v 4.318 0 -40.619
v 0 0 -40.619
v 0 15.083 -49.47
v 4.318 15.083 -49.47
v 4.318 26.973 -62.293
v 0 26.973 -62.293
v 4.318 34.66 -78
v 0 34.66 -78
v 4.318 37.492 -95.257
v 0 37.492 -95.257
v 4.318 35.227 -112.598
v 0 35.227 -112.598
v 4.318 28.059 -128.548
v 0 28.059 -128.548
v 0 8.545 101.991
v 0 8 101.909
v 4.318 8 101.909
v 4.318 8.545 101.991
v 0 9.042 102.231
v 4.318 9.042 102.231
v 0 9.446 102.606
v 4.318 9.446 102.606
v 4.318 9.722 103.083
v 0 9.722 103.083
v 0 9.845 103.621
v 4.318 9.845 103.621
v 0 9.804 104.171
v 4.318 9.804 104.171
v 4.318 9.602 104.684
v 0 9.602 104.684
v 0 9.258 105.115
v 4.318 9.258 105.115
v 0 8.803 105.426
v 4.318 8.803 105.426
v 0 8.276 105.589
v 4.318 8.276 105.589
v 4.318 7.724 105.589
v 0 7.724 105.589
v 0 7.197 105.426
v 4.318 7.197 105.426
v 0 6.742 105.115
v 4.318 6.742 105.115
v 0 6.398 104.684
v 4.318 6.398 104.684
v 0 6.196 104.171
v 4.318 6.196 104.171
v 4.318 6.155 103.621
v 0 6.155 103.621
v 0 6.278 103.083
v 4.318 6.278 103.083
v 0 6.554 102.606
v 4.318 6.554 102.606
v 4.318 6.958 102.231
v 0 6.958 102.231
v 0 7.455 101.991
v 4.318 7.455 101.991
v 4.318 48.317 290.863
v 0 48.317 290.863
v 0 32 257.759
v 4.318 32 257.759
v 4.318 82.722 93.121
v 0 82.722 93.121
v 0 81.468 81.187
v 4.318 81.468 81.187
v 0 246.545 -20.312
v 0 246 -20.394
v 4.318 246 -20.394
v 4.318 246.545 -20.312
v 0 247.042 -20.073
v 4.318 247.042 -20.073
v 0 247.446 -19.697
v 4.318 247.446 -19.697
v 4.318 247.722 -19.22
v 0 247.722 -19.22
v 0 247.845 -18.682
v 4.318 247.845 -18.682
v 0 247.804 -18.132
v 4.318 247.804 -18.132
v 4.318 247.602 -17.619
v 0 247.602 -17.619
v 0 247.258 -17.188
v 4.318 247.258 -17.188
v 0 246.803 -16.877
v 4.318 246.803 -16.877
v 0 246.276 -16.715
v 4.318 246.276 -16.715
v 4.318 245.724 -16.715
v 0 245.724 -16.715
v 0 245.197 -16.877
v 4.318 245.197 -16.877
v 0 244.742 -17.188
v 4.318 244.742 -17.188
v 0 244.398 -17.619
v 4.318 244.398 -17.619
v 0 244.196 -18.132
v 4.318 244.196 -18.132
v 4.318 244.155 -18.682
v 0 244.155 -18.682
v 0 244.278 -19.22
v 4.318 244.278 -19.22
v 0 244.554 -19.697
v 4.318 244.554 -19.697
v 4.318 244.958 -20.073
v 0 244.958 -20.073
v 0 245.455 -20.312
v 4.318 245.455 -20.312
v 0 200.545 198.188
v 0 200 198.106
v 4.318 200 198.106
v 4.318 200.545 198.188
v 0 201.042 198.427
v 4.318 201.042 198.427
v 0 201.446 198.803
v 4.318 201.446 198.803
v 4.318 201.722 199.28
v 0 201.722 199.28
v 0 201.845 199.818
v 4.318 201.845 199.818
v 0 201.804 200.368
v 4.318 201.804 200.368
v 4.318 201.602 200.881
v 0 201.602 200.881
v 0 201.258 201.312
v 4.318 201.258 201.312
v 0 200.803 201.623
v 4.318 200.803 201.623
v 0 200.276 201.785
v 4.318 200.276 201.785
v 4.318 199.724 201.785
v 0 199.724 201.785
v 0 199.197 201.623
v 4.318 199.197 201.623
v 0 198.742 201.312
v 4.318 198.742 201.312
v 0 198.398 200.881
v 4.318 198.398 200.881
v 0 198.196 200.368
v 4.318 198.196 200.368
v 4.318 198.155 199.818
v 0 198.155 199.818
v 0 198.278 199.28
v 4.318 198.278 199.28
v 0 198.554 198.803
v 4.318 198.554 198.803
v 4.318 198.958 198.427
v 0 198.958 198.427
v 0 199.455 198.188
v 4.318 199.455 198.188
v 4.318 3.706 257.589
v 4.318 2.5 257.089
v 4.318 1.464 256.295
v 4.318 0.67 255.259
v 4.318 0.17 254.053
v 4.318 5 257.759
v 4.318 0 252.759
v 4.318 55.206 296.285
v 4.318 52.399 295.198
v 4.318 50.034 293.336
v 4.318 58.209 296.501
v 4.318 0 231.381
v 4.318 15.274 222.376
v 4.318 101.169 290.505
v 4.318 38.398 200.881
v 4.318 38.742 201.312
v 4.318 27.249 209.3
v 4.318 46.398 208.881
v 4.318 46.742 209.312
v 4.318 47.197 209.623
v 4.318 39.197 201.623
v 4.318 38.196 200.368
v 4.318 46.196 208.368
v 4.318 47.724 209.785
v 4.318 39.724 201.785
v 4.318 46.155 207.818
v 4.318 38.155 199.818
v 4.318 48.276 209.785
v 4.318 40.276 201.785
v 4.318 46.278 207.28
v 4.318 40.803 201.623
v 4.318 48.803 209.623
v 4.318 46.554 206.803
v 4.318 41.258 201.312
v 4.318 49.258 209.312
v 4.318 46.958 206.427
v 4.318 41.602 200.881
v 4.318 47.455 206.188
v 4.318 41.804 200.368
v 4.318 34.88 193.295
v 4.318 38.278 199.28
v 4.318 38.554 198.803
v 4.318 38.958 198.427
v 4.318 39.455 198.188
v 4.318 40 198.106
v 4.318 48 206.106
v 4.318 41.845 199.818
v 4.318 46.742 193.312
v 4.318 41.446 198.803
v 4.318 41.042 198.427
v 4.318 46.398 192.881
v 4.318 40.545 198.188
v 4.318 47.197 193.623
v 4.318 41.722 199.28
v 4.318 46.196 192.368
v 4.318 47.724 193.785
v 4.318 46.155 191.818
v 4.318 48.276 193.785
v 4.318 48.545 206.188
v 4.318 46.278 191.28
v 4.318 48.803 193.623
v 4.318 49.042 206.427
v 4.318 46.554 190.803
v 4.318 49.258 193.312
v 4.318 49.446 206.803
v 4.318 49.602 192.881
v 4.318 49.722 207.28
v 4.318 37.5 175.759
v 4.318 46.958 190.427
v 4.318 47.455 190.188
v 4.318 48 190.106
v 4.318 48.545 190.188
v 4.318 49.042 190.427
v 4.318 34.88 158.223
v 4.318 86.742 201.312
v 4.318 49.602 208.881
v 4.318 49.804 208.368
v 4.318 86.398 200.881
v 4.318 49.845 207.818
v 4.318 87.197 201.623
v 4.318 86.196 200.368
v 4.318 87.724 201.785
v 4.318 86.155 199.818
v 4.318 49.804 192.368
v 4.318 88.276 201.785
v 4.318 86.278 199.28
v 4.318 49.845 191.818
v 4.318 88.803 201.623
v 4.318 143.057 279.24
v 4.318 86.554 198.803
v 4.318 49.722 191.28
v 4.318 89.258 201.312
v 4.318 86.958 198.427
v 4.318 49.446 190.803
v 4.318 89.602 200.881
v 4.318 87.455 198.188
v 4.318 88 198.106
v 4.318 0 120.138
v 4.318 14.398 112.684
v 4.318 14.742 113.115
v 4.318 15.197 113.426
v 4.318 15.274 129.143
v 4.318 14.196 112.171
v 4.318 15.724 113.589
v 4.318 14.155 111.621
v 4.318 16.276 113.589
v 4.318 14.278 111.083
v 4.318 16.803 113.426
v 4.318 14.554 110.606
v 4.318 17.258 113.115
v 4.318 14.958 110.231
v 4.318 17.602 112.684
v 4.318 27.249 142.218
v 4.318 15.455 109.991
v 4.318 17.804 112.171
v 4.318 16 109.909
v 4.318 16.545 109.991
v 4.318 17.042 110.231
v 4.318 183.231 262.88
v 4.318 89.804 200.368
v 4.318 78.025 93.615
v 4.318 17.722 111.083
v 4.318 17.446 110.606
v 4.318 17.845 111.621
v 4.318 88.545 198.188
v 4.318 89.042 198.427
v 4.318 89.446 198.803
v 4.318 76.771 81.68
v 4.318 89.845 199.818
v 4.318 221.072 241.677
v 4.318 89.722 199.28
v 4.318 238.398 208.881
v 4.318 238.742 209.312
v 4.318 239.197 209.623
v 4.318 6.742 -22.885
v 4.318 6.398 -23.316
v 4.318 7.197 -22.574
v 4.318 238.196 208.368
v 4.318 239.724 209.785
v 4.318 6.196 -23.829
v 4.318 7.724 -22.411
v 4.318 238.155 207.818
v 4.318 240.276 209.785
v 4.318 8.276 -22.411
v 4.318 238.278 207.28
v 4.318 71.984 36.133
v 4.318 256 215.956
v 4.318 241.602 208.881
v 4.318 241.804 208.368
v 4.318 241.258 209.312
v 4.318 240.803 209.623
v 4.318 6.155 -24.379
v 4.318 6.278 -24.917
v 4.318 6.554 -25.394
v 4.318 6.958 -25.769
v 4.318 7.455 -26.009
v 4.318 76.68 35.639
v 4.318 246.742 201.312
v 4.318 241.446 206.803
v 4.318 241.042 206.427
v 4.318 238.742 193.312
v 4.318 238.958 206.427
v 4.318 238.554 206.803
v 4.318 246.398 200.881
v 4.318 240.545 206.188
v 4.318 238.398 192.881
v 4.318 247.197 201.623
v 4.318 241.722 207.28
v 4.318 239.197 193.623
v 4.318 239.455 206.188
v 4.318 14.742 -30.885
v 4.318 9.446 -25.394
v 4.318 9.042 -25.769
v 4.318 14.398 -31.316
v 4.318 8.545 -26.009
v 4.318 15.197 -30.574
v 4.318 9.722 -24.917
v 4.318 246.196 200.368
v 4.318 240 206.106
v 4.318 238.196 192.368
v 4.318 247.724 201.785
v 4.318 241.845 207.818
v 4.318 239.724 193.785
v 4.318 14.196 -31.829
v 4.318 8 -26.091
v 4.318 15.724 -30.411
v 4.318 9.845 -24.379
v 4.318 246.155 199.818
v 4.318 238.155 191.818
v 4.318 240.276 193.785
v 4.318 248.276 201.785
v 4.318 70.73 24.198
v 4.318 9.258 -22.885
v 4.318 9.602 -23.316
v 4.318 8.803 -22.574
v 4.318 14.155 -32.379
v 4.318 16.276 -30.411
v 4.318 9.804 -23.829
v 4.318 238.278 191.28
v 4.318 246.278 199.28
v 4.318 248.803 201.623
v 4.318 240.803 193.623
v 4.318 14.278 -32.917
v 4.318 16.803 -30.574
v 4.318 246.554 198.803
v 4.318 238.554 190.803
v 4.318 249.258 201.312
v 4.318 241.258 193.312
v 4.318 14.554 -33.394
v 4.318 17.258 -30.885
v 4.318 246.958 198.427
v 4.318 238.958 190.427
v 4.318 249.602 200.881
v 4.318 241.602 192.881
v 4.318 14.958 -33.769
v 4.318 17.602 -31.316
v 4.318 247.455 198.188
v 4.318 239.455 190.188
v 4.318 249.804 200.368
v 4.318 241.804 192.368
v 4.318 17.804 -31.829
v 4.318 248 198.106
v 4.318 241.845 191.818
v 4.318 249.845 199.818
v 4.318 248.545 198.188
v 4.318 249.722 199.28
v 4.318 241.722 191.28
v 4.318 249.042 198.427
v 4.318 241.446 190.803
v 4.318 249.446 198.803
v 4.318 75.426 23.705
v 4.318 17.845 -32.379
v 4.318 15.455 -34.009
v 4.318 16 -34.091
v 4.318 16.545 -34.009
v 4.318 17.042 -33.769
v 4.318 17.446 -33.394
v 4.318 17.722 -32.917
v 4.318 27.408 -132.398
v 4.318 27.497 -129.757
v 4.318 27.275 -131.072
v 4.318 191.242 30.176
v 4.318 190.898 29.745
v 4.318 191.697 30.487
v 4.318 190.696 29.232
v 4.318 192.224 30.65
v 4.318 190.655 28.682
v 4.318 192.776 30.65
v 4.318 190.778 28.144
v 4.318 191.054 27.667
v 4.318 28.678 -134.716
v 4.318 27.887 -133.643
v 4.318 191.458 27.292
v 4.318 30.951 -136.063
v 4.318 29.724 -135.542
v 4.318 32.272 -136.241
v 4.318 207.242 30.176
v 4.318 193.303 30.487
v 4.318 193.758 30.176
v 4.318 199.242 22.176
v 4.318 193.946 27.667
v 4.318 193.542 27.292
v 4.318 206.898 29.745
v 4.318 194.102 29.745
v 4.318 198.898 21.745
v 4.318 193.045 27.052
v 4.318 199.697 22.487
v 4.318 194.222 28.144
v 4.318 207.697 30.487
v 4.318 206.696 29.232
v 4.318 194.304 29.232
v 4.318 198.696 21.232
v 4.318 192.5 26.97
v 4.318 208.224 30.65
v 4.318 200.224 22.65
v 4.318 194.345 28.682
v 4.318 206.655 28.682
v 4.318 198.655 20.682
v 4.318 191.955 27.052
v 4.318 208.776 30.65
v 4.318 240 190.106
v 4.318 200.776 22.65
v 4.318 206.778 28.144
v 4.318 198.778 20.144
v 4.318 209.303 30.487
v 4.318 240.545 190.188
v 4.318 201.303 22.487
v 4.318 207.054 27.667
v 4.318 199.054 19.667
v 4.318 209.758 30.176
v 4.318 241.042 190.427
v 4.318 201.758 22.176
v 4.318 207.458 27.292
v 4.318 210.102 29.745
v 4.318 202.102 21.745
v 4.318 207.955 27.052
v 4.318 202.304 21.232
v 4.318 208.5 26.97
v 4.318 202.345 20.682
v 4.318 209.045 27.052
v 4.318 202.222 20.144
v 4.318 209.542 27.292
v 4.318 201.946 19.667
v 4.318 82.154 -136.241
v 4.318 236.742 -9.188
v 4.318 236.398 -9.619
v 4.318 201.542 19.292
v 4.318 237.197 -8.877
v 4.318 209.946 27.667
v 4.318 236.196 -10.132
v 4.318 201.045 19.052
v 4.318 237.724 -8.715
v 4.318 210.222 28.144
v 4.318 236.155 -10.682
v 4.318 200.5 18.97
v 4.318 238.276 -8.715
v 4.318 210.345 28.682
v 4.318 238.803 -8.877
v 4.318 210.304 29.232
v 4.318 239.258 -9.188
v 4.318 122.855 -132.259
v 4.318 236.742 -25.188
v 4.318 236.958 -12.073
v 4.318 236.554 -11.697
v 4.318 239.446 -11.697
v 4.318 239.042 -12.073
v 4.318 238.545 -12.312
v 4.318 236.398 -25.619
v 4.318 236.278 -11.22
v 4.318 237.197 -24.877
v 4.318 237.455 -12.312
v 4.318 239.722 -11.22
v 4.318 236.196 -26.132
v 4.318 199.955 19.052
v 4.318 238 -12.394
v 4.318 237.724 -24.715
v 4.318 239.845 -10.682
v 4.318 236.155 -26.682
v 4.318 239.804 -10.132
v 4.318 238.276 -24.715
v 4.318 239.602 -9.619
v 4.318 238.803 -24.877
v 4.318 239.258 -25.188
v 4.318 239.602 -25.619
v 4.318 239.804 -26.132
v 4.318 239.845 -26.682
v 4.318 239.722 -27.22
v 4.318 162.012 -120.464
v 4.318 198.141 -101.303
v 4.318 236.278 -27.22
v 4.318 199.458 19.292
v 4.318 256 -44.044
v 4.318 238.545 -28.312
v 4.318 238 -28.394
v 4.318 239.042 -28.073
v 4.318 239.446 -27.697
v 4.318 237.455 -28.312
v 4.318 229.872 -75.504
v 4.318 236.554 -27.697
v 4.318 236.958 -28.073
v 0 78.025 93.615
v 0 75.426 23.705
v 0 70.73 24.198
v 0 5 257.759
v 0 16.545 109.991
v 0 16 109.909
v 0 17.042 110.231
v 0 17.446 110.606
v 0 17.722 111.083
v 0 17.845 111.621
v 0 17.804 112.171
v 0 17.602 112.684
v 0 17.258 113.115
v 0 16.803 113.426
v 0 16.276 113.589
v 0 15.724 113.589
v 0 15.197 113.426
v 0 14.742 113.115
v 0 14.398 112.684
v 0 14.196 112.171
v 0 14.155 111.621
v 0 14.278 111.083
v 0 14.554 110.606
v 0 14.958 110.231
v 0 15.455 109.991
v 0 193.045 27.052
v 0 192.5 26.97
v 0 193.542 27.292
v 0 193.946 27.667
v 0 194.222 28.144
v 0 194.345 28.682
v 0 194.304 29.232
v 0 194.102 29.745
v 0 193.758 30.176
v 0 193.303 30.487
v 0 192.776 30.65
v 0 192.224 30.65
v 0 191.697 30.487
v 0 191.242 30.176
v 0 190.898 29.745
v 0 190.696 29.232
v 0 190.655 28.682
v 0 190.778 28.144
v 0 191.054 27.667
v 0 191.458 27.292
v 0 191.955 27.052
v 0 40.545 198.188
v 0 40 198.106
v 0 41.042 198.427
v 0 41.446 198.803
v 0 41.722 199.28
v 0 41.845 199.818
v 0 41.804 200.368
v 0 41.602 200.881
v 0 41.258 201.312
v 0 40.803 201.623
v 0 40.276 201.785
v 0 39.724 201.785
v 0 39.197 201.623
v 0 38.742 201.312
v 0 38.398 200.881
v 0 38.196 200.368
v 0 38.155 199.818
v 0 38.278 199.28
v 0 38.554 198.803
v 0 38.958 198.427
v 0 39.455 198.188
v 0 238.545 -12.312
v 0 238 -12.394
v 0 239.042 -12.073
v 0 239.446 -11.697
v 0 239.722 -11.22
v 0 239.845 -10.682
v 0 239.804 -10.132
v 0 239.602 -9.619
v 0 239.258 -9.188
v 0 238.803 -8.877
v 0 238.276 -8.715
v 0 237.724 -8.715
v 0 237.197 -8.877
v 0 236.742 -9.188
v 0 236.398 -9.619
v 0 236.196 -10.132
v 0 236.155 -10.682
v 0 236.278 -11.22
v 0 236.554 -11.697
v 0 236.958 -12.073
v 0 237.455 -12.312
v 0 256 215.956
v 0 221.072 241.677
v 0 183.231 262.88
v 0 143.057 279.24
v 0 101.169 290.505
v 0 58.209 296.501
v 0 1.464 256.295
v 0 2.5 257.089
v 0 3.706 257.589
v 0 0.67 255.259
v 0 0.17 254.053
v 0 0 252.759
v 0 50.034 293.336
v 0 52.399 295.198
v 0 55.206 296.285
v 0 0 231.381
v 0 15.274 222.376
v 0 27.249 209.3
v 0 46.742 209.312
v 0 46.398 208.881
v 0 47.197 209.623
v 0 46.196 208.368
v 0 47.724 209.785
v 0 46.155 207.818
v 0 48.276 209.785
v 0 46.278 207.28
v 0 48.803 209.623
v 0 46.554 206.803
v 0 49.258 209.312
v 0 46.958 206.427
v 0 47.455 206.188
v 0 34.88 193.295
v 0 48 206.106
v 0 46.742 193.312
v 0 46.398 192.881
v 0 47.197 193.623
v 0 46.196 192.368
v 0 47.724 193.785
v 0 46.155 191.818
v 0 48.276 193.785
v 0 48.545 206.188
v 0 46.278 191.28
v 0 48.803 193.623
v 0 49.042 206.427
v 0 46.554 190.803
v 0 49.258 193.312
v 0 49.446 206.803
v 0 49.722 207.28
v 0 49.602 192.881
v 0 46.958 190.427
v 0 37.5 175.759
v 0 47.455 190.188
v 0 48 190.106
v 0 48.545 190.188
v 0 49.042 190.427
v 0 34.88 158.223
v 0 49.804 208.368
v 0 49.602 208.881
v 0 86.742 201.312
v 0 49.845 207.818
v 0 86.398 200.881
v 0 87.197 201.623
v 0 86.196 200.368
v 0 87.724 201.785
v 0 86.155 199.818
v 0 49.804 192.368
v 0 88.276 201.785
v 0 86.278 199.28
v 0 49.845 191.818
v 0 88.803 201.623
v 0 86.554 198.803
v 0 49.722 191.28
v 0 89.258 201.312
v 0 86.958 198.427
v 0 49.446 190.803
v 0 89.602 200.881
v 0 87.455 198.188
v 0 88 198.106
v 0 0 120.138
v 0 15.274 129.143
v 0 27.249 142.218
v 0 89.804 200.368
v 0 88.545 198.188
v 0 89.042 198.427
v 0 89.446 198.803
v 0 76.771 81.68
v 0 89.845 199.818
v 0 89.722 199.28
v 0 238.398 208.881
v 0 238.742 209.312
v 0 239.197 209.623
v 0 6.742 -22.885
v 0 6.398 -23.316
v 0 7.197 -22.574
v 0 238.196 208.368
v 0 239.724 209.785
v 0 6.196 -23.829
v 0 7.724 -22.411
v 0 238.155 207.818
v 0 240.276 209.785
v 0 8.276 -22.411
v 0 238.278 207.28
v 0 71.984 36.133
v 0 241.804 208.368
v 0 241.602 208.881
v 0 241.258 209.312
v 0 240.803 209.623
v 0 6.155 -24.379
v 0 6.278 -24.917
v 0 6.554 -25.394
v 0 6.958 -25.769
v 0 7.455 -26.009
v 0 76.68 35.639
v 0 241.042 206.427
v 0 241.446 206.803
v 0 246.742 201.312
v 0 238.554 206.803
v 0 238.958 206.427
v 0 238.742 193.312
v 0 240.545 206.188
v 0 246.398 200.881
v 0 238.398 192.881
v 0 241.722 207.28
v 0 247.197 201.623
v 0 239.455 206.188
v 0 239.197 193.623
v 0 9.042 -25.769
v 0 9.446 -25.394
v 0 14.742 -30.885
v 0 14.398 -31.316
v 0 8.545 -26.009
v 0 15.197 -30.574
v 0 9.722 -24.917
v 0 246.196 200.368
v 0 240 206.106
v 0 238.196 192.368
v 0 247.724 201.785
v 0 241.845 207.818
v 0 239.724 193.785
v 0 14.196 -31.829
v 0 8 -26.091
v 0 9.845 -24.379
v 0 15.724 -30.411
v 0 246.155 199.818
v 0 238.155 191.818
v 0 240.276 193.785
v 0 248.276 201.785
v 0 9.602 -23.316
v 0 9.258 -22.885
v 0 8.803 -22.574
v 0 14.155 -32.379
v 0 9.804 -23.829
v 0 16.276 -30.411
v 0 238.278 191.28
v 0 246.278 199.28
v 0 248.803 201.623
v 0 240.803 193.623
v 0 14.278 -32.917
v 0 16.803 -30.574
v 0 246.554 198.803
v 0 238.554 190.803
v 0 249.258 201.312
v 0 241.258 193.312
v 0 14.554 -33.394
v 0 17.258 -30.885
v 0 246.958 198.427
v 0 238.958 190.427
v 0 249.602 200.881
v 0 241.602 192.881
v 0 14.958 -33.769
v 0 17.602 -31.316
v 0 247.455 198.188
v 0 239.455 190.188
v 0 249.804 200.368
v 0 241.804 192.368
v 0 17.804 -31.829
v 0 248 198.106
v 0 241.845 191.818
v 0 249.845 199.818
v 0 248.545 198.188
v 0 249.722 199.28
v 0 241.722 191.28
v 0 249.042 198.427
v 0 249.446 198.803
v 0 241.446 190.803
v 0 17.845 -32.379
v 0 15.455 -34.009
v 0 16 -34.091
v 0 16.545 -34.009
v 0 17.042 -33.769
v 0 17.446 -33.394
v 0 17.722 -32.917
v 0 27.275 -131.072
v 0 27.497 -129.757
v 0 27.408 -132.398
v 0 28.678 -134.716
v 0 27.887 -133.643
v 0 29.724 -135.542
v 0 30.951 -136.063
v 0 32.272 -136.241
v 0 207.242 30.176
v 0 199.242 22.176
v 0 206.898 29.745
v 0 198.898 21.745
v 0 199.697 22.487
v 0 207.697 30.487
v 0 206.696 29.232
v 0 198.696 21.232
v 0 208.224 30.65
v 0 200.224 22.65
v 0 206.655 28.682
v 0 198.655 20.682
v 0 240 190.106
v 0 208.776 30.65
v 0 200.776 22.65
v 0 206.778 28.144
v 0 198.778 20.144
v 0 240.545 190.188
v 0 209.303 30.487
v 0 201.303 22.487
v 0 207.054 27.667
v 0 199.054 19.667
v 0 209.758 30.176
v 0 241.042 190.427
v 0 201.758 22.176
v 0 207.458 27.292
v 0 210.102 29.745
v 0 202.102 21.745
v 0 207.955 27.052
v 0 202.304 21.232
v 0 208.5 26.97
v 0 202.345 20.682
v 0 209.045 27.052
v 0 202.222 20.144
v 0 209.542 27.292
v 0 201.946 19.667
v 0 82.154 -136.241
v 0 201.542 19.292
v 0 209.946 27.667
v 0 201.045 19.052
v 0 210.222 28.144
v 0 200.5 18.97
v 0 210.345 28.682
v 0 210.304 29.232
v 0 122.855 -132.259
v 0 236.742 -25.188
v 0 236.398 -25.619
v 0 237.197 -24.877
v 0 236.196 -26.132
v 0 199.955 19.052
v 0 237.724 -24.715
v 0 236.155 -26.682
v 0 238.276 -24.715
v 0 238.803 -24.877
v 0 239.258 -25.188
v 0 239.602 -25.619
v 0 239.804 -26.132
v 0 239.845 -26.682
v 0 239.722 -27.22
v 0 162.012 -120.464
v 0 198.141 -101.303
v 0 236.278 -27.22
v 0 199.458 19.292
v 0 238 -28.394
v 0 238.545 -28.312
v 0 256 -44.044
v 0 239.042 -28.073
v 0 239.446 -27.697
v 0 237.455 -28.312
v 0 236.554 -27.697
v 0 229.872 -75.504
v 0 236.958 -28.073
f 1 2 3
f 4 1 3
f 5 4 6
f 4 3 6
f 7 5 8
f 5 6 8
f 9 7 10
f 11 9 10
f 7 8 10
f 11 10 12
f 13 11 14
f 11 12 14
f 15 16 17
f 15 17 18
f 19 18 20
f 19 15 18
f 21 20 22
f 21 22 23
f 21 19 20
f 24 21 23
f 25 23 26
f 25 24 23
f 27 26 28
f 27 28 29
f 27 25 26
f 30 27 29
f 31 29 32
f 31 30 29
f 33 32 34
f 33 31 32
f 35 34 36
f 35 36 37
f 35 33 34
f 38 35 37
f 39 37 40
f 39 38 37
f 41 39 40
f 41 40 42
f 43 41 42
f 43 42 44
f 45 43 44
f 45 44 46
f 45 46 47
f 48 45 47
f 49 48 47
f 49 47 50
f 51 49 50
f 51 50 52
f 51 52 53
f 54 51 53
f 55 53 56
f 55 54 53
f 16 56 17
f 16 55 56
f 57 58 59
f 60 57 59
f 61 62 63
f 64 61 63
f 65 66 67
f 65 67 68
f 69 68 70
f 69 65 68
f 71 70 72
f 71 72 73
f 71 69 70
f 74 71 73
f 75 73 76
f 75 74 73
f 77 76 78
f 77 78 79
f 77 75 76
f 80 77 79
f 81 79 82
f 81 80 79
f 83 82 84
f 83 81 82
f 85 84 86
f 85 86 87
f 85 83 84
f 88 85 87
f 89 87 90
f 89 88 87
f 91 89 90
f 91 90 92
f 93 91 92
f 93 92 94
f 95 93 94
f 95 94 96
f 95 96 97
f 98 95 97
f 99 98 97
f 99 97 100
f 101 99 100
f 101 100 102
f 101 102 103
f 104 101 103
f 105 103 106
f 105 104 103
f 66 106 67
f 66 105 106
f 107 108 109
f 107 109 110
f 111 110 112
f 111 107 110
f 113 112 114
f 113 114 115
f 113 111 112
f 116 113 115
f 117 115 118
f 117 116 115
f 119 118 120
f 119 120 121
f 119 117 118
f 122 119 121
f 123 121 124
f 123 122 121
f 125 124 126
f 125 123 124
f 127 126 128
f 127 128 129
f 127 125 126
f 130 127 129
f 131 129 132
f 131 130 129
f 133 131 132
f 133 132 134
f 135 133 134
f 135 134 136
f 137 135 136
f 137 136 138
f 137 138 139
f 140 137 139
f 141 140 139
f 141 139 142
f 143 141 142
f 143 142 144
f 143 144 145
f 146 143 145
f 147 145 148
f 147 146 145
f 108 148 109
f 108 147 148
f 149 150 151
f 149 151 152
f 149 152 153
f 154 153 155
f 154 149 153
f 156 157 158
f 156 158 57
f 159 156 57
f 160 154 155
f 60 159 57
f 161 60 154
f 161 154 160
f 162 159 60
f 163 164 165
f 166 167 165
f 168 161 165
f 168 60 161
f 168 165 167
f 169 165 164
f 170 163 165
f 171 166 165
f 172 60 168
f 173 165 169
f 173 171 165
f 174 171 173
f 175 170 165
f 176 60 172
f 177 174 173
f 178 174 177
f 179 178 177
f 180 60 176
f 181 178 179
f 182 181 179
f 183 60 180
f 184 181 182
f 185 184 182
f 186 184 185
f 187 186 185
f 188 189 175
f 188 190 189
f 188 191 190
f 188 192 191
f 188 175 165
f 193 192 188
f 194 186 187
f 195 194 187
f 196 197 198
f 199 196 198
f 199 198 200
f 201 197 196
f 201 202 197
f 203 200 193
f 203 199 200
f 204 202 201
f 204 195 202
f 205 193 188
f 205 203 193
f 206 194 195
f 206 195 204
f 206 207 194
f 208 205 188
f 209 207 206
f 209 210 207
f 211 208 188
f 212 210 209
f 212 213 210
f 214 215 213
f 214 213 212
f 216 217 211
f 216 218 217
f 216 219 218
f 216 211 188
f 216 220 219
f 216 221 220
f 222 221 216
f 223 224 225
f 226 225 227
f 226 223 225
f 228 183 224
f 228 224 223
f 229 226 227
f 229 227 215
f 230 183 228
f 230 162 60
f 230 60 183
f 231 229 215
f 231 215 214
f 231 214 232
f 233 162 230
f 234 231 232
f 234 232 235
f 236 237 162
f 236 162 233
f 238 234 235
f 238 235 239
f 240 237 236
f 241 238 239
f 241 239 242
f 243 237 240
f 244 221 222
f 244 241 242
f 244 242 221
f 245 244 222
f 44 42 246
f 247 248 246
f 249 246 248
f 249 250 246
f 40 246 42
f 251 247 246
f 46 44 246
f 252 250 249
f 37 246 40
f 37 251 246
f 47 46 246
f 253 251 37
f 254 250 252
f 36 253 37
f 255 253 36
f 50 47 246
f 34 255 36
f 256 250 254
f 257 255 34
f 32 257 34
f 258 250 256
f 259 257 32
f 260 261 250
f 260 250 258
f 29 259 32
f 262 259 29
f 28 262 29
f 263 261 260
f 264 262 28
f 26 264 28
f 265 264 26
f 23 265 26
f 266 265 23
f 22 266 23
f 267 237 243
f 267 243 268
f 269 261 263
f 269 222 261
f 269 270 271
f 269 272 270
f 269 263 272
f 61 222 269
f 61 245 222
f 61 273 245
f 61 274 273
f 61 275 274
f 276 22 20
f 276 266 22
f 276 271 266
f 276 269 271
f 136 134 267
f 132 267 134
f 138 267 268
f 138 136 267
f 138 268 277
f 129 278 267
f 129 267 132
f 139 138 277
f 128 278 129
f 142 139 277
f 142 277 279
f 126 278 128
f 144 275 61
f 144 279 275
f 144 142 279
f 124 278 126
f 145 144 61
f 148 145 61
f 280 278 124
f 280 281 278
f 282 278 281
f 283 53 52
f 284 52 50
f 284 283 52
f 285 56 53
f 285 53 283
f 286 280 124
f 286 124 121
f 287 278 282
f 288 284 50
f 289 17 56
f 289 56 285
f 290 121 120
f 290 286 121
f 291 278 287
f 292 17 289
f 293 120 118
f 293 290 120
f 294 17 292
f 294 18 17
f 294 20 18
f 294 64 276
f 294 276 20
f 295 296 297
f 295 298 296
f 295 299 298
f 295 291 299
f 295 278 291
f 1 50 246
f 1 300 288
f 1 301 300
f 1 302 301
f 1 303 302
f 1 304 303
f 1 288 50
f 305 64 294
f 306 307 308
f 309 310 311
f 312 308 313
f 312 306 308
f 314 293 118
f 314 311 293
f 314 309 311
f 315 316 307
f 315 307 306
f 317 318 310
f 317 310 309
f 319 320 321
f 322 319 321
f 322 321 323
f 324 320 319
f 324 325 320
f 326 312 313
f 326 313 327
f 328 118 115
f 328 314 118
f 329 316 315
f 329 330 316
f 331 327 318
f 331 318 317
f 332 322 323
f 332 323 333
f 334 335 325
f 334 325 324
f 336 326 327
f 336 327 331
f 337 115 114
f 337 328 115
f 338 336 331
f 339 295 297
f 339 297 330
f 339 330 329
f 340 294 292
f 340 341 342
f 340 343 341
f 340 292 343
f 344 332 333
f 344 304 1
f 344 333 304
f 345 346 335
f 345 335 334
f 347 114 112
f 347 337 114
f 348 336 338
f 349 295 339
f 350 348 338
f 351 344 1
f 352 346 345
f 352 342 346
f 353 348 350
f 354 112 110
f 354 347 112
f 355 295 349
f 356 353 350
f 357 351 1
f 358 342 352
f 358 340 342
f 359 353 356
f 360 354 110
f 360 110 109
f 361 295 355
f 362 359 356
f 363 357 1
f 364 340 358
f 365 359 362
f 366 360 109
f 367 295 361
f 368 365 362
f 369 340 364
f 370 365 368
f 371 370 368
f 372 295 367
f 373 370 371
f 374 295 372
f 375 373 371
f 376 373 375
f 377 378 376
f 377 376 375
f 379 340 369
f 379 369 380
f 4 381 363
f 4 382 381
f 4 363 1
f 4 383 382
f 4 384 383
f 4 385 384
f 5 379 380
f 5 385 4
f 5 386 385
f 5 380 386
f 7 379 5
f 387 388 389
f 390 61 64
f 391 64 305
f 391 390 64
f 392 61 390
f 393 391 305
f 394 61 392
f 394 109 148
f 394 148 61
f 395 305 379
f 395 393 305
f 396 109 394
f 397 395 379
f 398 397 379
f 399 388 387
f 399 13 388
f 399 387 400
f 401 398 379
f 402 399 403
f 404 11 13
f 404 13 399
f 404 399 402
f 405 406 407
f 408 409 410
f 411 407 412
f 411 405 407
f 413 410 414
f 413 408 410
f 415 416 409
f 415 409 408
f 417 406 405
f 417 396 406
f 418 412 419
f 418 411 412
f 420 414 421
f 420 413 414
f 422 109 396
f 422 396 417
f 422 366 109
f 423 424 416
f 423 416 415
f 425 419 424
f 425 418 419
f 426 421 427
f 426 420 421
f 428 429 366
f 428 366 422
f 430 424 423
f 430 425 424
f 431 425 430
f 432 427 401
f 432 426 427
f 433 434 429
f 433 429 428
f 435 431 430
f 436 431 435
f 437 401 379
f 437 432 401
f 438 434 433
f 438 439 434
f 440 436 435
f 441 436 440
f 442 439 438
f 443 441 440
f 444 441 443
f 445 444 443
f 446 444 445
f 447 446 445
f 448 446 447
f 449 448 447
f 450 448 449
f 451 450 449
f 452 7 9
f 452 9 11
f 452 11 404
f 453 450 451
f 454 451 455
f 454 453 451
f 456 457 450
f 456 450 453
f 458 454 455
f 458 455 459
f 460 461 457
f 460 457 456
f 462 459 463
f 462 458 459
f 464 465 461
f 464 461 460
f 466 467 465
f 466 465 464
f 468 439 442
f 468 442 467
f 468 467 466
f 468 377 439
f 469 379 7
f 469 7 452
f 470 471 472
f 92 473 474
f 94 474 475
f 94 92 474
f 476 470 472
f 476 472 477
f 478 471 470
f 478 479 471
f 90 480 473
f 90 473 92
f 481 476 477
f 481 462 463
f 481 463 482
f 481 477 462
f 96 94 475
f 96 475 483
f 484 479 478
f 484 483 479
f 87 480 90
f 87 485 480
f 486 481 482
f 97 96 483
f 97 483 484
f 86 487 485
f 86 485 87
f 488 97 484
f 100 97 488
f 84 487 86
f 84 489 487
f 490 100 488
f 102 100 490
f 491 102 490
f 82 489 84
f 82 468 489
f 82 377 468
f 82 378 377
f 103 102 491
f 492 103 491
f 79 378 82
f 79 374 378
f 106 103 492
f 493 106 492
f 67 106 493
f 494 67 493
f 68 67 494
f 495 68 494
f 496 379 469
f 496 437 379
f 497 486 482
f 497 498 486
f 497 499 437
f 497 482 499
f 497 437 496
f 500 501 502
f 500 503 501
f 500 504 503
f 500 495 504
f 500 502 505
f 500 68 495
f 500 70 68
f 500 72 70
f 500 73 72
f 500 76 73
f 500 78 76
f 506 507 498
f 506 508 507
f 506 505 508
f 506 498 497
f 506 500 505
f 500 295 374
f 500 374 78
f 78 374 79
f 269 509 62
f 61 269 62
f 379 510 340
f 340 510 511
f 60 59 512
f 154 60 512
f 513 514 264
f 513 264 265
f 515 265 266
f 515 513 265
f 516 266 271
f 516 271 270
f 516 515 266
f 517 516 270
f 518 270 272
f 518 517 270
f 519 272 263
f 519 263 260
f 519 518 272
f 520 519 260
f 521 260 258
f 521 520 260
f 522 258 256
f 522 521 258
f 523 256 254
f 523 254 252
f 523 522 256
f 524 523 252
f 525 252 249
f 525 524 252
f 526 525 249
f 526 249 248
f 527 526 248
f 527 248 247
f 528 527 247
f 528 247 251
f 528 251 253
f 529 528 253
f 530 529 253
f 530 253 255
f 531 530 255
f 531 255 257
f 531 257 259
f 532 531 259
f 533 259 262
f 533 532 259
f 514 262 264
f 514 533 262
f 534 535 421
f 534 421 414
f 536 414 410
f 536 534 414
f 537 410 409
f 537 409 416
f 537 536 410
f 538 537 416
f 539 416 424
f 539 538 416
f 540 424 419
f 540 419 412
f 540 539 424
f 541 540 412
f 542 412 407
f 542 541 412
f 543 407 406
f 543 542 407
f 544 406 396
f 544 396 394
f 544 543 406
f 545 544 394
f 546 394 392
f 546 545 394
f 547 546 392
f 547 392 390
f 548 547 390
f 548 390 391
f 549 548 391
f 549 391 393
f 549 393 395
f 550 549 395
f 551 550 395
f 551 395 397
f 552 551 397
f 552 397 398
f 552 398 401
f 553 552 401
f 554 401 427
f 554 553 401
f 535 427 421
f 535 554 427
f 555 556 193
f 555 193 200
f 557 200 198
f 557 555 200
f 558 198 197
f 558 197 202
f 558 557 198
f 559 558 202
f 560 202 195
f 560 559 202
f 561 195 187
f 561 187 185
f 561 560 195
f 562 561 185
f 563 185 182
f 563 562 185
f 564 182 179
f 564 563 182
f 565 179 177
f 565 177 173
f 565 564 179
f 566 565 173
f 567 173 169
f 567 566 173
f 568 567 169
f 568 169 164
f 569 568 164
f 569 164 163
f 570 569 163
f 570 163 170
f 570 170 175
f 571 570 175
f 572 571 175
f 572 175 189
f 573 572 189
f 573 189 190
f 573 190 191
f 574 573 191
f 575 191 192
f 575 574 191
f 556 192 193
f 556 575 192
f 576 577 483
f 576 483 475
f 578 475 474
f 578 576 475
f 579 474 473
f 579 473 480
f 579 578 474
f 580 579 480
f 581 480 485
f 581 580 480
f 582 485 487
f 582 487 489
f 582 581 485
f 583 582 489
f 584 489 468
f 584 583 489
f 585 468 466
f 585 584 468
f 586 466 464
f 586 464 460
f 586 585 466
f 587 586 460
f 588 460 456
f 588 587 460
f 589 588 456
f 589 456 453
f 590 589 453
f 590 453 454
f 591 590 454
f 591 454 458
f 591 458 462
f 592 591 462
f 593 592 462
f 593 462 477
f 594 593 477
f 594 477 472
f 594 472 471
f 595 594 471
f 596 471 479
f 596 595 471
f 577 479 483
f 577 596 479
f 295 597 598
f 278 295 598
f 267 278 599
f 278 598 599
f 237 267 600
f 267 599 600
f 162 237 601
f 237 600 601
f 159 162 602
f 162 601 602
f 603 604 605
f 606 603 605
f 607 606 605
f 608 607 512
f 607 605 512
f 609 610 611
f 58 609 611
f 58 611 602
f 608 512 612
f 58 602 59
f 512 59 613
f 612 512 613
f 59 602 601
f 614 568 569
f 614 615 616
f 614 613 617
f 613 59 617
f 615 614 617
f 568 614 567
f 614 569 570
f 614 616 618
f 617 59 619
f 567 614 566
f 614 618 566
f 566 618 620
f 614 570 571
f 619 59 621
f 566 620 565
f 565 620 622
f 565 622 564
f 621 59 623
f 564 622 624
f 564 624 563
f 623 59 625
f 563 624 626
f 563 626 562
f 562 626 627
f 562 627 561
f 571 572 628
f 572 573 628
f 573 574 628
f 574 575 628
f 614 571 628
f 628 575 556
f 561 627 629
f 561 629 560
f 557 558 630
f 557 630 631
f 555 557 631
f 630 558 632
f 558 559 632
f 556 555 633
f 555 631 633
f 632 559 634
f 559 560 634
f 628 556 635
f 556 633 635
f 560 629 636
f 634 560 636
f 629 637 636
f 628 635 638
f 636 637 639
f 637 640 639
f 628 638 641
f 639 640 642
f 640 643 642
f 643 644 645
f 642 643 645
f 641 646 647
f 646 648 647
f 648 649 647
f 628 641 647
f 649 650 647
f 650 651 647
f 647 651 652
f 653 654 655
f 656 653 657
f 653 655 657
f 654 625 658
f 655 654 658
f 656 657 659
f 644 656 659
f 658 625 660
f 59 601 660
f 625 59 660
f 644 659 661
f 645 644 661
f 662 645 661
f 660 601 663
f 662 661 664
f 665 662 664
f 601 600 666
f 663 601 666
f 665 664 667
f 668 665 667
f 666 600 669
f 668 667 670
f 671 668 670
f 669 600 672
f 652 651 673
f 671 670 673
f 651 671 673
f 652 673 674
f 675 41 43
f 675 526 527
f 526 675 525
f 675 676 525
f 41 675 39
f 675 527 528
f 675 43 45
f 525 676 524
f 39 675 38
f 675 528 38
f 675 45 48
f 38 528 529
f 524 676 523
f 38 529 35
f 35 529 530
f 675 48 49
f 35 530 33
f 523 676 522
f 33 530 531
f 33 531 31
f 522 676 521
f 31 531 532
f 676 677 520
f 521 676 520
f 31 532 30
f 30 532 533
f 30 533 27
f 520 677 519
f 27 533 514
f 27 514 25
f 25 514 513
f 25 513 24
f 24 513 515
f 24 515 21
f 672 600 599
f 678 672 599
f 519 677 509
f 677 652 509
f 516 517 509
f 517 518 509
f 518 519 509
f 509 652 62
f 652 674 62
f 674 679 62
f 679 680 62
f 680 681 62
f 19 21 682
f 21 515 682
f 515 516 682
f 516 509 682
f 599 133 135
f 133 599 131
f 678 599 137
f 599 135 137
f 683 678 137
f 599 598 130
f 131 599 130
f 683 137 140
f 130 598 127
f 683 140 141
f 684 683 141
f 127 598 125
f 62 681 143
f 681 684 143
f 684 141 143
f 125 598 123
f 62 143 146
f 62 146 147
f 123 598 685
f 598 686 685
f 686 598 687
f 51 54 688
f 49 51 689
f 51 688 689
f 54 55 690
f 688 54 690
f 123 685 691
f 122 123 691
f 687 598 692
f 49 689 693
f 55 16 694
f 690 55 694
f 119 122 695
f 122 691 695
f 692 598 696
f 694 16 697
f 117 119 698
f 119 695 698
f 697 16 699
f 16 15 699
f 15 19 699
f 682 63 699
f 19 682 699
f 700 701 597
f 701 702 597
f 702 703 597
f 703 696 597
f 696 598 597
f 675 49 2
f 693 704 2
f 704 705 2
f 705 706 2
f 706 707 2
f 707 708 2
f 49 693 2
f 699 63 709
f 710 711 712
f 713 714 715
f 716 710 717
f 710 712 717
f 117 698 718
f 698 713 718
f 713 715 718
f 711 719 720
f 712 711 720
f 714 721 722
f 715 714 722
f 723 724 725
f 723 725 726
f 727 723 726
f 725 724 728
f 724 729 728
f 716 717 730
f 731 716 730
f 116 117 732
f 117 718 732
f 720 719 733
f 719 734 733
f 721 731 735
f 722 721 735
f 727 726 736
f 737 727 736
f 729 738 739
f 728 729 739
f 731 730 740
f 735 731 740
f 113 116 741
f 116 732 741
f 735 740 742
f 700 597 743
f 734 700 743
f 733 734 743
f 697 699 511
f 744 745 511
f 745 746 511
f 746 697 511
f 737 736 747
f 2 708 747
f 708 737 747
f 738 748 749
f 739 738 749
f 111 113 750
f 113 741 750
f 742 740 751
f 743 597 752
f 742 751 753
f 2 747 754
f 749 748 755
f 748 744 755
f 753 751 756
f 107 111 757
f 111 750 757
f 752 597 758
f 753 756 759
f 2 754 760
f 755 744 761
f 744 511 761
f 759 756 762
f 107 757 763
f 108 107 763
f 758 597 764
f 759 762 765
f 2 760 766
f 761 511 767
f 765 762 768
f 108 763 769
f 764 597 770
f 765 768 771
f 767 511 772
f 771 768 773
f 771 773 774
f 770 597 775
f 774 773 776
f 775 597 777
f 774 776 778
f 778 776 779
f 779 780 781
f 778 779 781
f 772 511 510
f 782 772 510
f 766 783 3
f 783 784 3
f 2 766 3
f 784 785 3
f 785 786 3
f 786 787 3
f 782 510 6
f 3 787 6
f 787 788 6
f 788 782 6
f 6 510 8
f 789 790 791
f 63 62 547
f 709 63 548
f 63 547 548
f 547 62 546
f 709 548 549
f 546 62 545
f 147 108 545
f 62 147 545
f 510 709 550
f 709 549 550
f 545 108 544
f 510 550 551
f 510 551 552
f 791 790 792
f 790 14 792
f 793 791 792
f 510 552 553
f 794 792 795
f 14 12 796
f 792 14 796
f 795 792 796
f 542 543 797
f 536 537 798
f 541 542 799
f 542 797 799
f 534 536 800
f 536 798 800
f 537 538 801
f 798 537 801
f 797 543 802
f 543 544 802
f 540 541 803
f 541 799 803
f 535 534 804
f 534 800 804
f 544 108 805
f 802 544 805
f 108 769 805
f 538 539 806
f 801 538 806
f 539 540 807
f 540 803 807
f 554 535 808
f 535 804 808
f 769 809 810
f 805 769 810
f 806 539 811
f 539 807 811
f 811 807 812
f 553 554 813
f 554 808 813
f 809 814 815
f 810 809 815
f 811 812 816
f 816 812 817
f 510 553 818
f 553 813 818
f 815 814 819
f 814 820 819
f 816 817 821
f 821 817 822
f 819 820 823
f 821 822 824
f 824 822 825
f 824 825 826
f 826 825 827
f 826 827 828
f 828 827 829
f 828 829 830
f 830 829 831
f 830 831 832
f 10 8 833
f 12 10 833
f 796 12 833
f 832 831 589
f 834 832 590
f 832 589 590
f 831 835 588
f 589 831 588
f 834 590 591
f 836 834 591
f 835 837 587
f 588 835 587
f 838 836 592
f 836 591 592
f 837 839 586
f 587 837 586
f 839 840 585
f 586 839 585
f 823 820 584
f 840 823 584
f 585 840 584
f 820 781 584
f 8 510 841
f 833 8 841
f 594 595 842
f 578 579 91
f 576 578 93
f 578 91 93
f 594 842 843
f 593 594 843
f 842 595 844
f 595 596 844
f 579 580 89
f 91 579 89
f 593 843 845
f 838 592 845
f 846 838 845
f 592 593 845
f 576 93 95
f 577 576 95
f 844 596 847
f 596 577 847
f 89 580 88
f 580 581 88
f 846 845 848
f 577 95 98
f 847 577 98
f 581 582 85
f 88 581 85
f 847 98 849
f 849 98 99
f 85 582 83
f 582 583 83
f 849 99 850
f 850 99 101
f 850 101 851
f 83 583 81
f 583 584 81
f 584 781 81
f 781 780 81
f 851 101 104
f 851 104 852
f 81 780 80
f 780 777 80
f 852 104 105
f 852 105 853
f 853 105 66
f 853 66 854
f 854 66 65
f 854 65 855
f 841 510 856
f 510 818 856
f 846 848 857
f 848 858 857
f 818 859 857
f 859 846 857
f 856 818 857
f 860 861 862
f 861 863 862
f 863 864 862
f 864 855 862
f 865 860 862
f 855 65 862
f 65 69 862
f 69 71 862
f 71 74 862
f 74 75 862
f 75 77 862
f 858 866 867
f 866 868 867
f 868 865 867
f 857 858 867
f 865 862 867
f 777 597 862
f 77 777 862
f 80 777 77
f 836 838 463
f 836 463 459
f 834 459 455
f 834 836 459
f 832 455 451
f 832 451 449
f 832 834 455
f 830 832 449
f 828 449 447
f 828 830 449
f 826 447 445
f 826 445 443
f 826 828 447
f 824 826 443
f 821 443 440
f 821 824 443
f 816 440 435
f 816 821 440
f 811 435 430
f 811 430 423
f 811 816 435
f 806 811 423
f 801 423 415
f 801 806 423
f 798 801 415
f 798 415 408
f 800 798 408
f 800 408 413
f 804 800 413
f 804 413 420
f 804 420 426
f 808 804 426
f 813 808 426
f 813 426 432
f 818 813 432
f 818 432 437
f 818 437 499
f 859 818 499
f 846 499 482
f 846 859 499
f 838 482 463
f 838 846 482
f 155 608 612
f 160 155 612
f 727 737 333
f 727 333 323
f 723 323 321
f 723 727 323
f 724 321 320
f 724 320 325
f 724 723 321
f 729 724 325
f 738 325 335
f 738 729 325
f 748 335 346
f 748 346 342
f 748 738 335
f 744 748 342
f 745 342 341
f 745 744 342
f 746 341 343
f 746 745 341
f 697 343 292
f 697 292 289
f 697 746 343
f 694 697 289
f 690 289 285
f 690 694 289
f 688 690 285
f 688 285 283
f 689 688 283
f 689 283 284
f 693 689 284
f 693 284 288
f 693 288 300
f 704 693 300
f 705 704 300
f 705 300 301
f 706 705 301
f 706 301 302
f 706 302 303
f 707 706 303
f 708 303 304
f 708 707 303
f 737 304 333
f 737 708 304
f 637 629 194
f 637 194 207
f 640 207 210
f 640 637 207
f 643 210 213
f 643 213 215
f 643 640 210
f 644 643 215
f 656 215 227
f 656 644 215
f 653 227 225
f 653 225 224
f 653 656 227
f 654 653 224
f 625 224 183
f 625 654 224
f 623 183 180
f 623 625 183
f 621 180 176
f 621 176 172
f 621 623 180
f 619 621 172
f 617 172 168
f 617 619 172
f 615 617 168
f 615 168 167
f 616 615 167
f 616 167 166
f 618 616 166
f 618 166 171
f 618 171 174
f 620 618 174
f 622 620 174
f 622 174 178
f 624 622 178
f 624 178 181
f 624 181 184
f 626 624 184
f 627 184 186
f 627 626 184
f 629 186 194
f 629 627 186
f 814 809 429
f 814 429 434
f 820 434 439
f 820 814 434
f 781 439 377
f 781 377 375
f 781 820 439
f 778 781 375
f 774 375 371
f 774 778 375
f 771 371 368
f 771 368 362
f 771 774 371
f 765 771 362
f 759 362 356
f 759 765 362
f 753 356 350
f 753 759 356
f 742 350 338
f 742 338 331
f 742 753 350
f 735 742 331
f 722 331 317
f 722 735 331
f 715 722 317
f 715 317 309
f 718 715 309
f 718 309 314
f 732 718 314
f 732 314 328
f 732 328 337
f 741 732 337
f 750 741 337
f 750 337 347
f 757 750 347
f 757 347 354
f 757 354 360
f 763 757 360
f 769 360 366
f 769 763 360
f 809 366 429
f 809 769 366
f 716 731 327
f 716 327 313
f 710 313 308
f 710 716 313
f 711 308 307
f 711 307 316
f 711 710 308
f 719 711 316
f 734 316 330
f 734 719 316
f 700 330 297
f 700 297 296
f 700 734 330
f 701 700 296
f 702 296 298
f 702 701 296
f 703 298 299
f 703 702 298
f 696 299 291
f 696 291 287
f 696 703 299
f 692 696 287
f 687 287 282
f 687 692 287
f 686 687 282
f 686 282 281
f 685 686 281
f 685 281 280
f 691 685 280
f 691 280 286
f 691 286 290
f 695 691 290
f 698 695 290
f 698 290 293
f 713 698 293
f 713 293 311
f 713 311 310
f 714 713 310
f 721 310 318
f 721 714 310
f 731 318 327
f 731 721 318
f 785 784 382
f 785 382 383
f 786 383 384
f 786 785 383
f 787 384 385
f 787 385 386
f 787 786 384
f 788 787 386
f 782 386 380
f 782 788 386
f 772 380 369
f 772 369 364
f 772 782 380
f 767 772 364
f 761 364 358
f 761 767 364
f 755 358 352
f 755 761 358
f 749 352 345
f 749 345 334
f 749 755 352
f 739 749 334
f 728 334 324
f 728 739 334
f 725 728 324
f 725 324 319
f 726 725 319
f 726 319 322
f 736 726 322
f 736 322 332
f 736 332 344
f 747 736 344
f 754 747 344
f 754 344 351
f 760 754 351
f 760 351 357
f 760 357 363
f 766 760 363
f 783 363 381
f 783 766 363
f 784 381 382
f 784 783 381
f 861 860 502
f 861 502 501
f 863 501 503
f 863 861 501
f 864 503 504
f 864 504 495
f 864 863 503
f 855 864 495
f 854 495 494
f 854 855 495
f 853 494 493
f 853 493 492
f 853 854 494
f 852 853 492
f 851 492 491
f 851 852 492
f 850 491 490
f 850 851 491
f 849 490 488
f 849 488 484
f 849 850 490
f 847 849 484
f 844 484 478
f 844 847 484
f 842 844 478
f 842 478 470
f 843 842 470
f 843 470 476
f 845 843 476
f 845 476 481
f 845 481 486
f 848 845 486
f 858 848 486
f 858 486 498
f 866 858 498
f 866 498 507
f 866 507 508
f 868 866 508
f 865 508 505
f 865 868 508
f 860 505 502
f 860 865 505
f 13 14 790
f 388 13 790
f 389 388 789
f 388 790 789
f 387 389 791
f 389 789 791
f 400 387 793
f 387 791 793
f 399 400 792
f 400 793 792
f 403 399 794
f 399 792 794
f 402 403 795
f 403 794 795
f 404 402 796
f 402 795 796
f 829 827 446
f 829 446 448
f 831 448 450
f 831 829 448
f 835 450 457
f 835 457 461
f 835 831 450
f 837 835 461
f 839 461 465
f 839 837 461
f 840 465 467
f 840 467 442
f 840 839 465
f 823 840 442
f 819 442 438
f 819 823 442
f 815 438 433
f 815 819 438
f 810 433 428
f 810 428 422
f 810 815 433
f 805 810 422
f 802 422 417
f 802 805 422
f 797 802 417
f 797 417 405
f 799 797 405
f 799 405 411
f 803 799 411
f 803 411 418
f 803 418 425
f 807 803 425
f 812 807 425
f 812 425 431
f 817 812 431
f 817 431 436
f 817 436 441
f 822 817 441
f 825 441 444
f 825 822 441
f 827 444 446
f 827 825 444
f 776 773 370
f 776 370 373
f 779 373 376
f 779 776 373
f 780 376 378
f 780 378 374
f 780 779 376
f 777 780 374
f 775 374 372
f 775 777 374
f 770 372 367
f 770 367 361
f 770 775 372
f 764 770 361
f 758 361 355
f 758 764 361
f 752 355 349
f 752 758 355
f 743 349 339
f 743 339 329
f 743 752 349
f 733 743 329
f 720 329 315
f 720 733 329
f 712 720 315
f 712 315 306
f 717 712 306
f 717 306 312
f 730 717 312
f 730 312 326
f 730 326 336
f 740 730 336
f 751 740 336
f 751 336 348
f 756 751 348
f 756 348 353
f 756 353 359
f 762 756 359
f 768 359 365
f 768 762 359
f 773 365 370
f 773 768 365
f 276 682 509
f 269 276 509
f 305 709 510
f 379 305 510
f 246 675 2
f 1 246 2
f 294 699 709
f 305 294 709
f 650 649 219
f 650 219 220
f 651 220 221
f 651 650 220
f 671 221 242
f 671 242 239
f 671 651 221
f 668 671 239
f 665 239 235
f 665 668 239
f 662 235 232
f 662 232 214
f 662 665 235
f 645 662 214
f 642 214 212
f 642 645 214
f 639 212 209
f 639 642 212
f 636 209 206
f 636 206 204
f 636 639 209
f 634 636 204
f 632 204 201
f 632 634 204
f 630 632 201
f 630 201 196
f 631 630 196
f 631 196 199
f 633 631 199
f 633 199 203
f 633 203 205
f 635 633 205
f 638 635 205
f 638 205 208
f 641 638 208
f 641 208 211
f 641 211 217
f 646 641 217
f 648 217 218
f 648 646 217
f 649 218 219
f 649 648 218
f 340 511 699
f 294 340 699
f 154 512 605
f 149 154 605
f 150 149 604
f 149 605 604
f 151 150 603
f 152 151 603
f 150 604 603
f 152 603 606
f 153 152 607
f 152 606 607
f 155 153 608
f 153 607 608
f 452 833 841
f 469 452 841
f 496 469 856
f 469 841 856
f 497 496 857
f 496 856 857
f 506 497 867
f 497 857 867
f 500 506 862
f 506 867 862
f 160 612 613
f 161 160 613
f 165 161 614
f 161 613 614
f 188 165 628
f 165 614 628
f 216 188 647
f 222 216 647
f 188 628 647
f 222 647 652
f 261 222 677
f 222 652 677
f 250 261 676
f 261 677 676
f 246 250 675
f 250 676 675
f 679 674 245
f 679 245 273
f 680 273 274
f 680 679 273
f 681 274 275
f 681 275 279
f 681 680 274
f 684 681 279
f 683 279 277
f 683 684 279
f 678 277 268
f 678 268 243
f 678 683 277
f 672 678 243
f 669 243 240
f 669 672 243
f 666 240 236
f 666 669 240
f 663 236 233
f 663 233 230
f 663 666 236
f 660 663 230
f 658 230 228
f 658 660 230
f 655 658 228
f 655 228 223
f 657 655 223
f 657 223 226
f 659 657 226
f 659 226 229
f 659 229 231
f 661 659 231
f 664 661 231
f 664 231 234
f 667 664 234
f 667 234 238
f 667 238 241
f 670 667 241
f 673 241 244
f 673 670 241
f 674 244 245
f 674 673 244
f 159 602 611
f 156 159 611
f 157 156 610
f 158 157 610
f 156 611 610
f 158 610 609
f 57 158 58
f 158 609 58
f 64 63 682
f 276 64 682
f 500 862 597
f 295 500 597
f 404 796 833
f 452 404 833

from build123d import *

# Parameters (mm, degrees)
SKETCH1_R           = 1.85
BOSS_EXTRUDE1_DEPTH = 4.318


with BuildPart() as part:
    # Sketch1 → Boss-Extrude1 (new body)
    with BuildSketch(Plane(origin=(0, 0, 0), x_dir=(0, 0, -1), z_dir=(1, 0, 0))):
        with BuildLine():
            Line((136.240741284, 32.272255751), (136.240741284, 82.154119676))
            ThreePointArc((136.240741284, 82.154119676), (111.765249408, 180.544448903), (44.044009042, 256))
            Line((44.044009042, 256), (-215.955990958, 256))
            ThreePointArc((-215.955990958, 256), (-271.683097829, 163.39777941), (-296.50139881, 58.208741794))
            ThreePointArc((-296.50139881, 58.208741794), (-295.198004633, 52.399053051), (-290.863193916, 48.3172966))
            Line((-290.863193916, 48.3172966), (-257.759258716, 32))
            Line((-257.759258716, 32), (-257.759258716, 5))
            ThreePointArc((-257.759258716, 5), (-256.294792622, 1.464466094), (-252.759258716, 0))
            Line((-252.759258716, 0), (-231.380747369, 0))
            ThreePointArc((-231.380747369, 0), (-175.759258716, 37.5), (-120.137770063, 0))
            Line((-120.137770063, 0), (40.619252631, 0))
            ThreePointArc((40.619252631, 0), (78.000395352, 34.660211514), (128.548433592, 28.059005308))
            ThreePointArc((128.548433592, 28.059005308), (133.642663591, 27.886965654), (136.240741284, 32.272255751))
        make_face()
        with Locations((-207.955990958, 48)):
            Circle(SKETCH1_R, mode=Mode.SUBTRACT)
        with Locations((-191.955990958, 48)):
            Circle(SKETCH1_R, mode=Mode.SUBTRACT)
        with Locations((-199.955990958, 40)):
            Circle(SKETCH1_R, mode=Mode.SUBTRACT)
        with Locations((-199.955990958, 200)):
            Circle(SKETCH1_R, mode=Mode.SUBTRACT)
        with Locations((-191.955990958, 240)):
            Circle(SKETCH1_R, mode=Mode.SUBTRACT)
        with Locations((-207.955990958, 240)):
            Circle(SKETCH1_R, mode=Mode.SUBTRACT)
        with Locations((-199.955990958, 248)):
            Circle(SKETCH1_R, mode=Mode.SUBTRACT)
        with Locations((-199.955990958, 88)):
            Circle(SKETCH1_R, mode=Mode.SUBTRACT)
        with Locations((-111.759258716, 16)):
            Circle(SKETCH1_R, mode=Mode.SUBTRACT)
        with Locations((32.240741284, 16)):
            Circle(SKETCH1_R, mode=Mode.SUBTRACT)
        with Locations((24.240741284, 8)):
            Circle(SKETCH1_R, mode=Mode.SUBTRACT)
        with Locations((-103.759258716, 8)):
            Circle(SKETCH1_R, mode=Mode.SUBTRACT)
        with Locations((-28.820215612, 192.5)):
            Circle(SKETCH1_R, mode=Mode.SUBTRACT)
        with Locations((-20.820215612, 200.5)):
            Circle(SKETCH1_R, mode=Mode.SUBTRACT)
        with Locations((-28.820215612, 208.5)):
            Circle(SKETCH1_R, mode=Mode.SUBTRACT)
        with Locations((26.544009042, 238)):
            Circle(SKETCH1_R, mode=Mode.SUBTRACT)
        with Locations((10.544009042, 238)):
            Circle(SKETCH1_R, mode=Mode.SUBTRACT)
        with Locations((18.544009042, 246)):
            Circle(SKETCH1_R, mode=Mode.SUBTRACT)
        Polygon((-93.121069237, 82.721950219), (-81.186806492, 81.46760866), (-81.680426507, 76.771127937), (-93.614689252, 78.025469496), align=None, mode=Mode.SUBTRACT)
        Polygon((-35.639064197, 76.680348038), (-23.704801453, 75.426006479), (-24.198421467, 70.729525756), (-36.132684212, 71.983867315), align=None, mode=Mode.SUBTRACT)
    extrude(amount=BOSS_EXTRUDE1_DEPTH)


solid = part.part
